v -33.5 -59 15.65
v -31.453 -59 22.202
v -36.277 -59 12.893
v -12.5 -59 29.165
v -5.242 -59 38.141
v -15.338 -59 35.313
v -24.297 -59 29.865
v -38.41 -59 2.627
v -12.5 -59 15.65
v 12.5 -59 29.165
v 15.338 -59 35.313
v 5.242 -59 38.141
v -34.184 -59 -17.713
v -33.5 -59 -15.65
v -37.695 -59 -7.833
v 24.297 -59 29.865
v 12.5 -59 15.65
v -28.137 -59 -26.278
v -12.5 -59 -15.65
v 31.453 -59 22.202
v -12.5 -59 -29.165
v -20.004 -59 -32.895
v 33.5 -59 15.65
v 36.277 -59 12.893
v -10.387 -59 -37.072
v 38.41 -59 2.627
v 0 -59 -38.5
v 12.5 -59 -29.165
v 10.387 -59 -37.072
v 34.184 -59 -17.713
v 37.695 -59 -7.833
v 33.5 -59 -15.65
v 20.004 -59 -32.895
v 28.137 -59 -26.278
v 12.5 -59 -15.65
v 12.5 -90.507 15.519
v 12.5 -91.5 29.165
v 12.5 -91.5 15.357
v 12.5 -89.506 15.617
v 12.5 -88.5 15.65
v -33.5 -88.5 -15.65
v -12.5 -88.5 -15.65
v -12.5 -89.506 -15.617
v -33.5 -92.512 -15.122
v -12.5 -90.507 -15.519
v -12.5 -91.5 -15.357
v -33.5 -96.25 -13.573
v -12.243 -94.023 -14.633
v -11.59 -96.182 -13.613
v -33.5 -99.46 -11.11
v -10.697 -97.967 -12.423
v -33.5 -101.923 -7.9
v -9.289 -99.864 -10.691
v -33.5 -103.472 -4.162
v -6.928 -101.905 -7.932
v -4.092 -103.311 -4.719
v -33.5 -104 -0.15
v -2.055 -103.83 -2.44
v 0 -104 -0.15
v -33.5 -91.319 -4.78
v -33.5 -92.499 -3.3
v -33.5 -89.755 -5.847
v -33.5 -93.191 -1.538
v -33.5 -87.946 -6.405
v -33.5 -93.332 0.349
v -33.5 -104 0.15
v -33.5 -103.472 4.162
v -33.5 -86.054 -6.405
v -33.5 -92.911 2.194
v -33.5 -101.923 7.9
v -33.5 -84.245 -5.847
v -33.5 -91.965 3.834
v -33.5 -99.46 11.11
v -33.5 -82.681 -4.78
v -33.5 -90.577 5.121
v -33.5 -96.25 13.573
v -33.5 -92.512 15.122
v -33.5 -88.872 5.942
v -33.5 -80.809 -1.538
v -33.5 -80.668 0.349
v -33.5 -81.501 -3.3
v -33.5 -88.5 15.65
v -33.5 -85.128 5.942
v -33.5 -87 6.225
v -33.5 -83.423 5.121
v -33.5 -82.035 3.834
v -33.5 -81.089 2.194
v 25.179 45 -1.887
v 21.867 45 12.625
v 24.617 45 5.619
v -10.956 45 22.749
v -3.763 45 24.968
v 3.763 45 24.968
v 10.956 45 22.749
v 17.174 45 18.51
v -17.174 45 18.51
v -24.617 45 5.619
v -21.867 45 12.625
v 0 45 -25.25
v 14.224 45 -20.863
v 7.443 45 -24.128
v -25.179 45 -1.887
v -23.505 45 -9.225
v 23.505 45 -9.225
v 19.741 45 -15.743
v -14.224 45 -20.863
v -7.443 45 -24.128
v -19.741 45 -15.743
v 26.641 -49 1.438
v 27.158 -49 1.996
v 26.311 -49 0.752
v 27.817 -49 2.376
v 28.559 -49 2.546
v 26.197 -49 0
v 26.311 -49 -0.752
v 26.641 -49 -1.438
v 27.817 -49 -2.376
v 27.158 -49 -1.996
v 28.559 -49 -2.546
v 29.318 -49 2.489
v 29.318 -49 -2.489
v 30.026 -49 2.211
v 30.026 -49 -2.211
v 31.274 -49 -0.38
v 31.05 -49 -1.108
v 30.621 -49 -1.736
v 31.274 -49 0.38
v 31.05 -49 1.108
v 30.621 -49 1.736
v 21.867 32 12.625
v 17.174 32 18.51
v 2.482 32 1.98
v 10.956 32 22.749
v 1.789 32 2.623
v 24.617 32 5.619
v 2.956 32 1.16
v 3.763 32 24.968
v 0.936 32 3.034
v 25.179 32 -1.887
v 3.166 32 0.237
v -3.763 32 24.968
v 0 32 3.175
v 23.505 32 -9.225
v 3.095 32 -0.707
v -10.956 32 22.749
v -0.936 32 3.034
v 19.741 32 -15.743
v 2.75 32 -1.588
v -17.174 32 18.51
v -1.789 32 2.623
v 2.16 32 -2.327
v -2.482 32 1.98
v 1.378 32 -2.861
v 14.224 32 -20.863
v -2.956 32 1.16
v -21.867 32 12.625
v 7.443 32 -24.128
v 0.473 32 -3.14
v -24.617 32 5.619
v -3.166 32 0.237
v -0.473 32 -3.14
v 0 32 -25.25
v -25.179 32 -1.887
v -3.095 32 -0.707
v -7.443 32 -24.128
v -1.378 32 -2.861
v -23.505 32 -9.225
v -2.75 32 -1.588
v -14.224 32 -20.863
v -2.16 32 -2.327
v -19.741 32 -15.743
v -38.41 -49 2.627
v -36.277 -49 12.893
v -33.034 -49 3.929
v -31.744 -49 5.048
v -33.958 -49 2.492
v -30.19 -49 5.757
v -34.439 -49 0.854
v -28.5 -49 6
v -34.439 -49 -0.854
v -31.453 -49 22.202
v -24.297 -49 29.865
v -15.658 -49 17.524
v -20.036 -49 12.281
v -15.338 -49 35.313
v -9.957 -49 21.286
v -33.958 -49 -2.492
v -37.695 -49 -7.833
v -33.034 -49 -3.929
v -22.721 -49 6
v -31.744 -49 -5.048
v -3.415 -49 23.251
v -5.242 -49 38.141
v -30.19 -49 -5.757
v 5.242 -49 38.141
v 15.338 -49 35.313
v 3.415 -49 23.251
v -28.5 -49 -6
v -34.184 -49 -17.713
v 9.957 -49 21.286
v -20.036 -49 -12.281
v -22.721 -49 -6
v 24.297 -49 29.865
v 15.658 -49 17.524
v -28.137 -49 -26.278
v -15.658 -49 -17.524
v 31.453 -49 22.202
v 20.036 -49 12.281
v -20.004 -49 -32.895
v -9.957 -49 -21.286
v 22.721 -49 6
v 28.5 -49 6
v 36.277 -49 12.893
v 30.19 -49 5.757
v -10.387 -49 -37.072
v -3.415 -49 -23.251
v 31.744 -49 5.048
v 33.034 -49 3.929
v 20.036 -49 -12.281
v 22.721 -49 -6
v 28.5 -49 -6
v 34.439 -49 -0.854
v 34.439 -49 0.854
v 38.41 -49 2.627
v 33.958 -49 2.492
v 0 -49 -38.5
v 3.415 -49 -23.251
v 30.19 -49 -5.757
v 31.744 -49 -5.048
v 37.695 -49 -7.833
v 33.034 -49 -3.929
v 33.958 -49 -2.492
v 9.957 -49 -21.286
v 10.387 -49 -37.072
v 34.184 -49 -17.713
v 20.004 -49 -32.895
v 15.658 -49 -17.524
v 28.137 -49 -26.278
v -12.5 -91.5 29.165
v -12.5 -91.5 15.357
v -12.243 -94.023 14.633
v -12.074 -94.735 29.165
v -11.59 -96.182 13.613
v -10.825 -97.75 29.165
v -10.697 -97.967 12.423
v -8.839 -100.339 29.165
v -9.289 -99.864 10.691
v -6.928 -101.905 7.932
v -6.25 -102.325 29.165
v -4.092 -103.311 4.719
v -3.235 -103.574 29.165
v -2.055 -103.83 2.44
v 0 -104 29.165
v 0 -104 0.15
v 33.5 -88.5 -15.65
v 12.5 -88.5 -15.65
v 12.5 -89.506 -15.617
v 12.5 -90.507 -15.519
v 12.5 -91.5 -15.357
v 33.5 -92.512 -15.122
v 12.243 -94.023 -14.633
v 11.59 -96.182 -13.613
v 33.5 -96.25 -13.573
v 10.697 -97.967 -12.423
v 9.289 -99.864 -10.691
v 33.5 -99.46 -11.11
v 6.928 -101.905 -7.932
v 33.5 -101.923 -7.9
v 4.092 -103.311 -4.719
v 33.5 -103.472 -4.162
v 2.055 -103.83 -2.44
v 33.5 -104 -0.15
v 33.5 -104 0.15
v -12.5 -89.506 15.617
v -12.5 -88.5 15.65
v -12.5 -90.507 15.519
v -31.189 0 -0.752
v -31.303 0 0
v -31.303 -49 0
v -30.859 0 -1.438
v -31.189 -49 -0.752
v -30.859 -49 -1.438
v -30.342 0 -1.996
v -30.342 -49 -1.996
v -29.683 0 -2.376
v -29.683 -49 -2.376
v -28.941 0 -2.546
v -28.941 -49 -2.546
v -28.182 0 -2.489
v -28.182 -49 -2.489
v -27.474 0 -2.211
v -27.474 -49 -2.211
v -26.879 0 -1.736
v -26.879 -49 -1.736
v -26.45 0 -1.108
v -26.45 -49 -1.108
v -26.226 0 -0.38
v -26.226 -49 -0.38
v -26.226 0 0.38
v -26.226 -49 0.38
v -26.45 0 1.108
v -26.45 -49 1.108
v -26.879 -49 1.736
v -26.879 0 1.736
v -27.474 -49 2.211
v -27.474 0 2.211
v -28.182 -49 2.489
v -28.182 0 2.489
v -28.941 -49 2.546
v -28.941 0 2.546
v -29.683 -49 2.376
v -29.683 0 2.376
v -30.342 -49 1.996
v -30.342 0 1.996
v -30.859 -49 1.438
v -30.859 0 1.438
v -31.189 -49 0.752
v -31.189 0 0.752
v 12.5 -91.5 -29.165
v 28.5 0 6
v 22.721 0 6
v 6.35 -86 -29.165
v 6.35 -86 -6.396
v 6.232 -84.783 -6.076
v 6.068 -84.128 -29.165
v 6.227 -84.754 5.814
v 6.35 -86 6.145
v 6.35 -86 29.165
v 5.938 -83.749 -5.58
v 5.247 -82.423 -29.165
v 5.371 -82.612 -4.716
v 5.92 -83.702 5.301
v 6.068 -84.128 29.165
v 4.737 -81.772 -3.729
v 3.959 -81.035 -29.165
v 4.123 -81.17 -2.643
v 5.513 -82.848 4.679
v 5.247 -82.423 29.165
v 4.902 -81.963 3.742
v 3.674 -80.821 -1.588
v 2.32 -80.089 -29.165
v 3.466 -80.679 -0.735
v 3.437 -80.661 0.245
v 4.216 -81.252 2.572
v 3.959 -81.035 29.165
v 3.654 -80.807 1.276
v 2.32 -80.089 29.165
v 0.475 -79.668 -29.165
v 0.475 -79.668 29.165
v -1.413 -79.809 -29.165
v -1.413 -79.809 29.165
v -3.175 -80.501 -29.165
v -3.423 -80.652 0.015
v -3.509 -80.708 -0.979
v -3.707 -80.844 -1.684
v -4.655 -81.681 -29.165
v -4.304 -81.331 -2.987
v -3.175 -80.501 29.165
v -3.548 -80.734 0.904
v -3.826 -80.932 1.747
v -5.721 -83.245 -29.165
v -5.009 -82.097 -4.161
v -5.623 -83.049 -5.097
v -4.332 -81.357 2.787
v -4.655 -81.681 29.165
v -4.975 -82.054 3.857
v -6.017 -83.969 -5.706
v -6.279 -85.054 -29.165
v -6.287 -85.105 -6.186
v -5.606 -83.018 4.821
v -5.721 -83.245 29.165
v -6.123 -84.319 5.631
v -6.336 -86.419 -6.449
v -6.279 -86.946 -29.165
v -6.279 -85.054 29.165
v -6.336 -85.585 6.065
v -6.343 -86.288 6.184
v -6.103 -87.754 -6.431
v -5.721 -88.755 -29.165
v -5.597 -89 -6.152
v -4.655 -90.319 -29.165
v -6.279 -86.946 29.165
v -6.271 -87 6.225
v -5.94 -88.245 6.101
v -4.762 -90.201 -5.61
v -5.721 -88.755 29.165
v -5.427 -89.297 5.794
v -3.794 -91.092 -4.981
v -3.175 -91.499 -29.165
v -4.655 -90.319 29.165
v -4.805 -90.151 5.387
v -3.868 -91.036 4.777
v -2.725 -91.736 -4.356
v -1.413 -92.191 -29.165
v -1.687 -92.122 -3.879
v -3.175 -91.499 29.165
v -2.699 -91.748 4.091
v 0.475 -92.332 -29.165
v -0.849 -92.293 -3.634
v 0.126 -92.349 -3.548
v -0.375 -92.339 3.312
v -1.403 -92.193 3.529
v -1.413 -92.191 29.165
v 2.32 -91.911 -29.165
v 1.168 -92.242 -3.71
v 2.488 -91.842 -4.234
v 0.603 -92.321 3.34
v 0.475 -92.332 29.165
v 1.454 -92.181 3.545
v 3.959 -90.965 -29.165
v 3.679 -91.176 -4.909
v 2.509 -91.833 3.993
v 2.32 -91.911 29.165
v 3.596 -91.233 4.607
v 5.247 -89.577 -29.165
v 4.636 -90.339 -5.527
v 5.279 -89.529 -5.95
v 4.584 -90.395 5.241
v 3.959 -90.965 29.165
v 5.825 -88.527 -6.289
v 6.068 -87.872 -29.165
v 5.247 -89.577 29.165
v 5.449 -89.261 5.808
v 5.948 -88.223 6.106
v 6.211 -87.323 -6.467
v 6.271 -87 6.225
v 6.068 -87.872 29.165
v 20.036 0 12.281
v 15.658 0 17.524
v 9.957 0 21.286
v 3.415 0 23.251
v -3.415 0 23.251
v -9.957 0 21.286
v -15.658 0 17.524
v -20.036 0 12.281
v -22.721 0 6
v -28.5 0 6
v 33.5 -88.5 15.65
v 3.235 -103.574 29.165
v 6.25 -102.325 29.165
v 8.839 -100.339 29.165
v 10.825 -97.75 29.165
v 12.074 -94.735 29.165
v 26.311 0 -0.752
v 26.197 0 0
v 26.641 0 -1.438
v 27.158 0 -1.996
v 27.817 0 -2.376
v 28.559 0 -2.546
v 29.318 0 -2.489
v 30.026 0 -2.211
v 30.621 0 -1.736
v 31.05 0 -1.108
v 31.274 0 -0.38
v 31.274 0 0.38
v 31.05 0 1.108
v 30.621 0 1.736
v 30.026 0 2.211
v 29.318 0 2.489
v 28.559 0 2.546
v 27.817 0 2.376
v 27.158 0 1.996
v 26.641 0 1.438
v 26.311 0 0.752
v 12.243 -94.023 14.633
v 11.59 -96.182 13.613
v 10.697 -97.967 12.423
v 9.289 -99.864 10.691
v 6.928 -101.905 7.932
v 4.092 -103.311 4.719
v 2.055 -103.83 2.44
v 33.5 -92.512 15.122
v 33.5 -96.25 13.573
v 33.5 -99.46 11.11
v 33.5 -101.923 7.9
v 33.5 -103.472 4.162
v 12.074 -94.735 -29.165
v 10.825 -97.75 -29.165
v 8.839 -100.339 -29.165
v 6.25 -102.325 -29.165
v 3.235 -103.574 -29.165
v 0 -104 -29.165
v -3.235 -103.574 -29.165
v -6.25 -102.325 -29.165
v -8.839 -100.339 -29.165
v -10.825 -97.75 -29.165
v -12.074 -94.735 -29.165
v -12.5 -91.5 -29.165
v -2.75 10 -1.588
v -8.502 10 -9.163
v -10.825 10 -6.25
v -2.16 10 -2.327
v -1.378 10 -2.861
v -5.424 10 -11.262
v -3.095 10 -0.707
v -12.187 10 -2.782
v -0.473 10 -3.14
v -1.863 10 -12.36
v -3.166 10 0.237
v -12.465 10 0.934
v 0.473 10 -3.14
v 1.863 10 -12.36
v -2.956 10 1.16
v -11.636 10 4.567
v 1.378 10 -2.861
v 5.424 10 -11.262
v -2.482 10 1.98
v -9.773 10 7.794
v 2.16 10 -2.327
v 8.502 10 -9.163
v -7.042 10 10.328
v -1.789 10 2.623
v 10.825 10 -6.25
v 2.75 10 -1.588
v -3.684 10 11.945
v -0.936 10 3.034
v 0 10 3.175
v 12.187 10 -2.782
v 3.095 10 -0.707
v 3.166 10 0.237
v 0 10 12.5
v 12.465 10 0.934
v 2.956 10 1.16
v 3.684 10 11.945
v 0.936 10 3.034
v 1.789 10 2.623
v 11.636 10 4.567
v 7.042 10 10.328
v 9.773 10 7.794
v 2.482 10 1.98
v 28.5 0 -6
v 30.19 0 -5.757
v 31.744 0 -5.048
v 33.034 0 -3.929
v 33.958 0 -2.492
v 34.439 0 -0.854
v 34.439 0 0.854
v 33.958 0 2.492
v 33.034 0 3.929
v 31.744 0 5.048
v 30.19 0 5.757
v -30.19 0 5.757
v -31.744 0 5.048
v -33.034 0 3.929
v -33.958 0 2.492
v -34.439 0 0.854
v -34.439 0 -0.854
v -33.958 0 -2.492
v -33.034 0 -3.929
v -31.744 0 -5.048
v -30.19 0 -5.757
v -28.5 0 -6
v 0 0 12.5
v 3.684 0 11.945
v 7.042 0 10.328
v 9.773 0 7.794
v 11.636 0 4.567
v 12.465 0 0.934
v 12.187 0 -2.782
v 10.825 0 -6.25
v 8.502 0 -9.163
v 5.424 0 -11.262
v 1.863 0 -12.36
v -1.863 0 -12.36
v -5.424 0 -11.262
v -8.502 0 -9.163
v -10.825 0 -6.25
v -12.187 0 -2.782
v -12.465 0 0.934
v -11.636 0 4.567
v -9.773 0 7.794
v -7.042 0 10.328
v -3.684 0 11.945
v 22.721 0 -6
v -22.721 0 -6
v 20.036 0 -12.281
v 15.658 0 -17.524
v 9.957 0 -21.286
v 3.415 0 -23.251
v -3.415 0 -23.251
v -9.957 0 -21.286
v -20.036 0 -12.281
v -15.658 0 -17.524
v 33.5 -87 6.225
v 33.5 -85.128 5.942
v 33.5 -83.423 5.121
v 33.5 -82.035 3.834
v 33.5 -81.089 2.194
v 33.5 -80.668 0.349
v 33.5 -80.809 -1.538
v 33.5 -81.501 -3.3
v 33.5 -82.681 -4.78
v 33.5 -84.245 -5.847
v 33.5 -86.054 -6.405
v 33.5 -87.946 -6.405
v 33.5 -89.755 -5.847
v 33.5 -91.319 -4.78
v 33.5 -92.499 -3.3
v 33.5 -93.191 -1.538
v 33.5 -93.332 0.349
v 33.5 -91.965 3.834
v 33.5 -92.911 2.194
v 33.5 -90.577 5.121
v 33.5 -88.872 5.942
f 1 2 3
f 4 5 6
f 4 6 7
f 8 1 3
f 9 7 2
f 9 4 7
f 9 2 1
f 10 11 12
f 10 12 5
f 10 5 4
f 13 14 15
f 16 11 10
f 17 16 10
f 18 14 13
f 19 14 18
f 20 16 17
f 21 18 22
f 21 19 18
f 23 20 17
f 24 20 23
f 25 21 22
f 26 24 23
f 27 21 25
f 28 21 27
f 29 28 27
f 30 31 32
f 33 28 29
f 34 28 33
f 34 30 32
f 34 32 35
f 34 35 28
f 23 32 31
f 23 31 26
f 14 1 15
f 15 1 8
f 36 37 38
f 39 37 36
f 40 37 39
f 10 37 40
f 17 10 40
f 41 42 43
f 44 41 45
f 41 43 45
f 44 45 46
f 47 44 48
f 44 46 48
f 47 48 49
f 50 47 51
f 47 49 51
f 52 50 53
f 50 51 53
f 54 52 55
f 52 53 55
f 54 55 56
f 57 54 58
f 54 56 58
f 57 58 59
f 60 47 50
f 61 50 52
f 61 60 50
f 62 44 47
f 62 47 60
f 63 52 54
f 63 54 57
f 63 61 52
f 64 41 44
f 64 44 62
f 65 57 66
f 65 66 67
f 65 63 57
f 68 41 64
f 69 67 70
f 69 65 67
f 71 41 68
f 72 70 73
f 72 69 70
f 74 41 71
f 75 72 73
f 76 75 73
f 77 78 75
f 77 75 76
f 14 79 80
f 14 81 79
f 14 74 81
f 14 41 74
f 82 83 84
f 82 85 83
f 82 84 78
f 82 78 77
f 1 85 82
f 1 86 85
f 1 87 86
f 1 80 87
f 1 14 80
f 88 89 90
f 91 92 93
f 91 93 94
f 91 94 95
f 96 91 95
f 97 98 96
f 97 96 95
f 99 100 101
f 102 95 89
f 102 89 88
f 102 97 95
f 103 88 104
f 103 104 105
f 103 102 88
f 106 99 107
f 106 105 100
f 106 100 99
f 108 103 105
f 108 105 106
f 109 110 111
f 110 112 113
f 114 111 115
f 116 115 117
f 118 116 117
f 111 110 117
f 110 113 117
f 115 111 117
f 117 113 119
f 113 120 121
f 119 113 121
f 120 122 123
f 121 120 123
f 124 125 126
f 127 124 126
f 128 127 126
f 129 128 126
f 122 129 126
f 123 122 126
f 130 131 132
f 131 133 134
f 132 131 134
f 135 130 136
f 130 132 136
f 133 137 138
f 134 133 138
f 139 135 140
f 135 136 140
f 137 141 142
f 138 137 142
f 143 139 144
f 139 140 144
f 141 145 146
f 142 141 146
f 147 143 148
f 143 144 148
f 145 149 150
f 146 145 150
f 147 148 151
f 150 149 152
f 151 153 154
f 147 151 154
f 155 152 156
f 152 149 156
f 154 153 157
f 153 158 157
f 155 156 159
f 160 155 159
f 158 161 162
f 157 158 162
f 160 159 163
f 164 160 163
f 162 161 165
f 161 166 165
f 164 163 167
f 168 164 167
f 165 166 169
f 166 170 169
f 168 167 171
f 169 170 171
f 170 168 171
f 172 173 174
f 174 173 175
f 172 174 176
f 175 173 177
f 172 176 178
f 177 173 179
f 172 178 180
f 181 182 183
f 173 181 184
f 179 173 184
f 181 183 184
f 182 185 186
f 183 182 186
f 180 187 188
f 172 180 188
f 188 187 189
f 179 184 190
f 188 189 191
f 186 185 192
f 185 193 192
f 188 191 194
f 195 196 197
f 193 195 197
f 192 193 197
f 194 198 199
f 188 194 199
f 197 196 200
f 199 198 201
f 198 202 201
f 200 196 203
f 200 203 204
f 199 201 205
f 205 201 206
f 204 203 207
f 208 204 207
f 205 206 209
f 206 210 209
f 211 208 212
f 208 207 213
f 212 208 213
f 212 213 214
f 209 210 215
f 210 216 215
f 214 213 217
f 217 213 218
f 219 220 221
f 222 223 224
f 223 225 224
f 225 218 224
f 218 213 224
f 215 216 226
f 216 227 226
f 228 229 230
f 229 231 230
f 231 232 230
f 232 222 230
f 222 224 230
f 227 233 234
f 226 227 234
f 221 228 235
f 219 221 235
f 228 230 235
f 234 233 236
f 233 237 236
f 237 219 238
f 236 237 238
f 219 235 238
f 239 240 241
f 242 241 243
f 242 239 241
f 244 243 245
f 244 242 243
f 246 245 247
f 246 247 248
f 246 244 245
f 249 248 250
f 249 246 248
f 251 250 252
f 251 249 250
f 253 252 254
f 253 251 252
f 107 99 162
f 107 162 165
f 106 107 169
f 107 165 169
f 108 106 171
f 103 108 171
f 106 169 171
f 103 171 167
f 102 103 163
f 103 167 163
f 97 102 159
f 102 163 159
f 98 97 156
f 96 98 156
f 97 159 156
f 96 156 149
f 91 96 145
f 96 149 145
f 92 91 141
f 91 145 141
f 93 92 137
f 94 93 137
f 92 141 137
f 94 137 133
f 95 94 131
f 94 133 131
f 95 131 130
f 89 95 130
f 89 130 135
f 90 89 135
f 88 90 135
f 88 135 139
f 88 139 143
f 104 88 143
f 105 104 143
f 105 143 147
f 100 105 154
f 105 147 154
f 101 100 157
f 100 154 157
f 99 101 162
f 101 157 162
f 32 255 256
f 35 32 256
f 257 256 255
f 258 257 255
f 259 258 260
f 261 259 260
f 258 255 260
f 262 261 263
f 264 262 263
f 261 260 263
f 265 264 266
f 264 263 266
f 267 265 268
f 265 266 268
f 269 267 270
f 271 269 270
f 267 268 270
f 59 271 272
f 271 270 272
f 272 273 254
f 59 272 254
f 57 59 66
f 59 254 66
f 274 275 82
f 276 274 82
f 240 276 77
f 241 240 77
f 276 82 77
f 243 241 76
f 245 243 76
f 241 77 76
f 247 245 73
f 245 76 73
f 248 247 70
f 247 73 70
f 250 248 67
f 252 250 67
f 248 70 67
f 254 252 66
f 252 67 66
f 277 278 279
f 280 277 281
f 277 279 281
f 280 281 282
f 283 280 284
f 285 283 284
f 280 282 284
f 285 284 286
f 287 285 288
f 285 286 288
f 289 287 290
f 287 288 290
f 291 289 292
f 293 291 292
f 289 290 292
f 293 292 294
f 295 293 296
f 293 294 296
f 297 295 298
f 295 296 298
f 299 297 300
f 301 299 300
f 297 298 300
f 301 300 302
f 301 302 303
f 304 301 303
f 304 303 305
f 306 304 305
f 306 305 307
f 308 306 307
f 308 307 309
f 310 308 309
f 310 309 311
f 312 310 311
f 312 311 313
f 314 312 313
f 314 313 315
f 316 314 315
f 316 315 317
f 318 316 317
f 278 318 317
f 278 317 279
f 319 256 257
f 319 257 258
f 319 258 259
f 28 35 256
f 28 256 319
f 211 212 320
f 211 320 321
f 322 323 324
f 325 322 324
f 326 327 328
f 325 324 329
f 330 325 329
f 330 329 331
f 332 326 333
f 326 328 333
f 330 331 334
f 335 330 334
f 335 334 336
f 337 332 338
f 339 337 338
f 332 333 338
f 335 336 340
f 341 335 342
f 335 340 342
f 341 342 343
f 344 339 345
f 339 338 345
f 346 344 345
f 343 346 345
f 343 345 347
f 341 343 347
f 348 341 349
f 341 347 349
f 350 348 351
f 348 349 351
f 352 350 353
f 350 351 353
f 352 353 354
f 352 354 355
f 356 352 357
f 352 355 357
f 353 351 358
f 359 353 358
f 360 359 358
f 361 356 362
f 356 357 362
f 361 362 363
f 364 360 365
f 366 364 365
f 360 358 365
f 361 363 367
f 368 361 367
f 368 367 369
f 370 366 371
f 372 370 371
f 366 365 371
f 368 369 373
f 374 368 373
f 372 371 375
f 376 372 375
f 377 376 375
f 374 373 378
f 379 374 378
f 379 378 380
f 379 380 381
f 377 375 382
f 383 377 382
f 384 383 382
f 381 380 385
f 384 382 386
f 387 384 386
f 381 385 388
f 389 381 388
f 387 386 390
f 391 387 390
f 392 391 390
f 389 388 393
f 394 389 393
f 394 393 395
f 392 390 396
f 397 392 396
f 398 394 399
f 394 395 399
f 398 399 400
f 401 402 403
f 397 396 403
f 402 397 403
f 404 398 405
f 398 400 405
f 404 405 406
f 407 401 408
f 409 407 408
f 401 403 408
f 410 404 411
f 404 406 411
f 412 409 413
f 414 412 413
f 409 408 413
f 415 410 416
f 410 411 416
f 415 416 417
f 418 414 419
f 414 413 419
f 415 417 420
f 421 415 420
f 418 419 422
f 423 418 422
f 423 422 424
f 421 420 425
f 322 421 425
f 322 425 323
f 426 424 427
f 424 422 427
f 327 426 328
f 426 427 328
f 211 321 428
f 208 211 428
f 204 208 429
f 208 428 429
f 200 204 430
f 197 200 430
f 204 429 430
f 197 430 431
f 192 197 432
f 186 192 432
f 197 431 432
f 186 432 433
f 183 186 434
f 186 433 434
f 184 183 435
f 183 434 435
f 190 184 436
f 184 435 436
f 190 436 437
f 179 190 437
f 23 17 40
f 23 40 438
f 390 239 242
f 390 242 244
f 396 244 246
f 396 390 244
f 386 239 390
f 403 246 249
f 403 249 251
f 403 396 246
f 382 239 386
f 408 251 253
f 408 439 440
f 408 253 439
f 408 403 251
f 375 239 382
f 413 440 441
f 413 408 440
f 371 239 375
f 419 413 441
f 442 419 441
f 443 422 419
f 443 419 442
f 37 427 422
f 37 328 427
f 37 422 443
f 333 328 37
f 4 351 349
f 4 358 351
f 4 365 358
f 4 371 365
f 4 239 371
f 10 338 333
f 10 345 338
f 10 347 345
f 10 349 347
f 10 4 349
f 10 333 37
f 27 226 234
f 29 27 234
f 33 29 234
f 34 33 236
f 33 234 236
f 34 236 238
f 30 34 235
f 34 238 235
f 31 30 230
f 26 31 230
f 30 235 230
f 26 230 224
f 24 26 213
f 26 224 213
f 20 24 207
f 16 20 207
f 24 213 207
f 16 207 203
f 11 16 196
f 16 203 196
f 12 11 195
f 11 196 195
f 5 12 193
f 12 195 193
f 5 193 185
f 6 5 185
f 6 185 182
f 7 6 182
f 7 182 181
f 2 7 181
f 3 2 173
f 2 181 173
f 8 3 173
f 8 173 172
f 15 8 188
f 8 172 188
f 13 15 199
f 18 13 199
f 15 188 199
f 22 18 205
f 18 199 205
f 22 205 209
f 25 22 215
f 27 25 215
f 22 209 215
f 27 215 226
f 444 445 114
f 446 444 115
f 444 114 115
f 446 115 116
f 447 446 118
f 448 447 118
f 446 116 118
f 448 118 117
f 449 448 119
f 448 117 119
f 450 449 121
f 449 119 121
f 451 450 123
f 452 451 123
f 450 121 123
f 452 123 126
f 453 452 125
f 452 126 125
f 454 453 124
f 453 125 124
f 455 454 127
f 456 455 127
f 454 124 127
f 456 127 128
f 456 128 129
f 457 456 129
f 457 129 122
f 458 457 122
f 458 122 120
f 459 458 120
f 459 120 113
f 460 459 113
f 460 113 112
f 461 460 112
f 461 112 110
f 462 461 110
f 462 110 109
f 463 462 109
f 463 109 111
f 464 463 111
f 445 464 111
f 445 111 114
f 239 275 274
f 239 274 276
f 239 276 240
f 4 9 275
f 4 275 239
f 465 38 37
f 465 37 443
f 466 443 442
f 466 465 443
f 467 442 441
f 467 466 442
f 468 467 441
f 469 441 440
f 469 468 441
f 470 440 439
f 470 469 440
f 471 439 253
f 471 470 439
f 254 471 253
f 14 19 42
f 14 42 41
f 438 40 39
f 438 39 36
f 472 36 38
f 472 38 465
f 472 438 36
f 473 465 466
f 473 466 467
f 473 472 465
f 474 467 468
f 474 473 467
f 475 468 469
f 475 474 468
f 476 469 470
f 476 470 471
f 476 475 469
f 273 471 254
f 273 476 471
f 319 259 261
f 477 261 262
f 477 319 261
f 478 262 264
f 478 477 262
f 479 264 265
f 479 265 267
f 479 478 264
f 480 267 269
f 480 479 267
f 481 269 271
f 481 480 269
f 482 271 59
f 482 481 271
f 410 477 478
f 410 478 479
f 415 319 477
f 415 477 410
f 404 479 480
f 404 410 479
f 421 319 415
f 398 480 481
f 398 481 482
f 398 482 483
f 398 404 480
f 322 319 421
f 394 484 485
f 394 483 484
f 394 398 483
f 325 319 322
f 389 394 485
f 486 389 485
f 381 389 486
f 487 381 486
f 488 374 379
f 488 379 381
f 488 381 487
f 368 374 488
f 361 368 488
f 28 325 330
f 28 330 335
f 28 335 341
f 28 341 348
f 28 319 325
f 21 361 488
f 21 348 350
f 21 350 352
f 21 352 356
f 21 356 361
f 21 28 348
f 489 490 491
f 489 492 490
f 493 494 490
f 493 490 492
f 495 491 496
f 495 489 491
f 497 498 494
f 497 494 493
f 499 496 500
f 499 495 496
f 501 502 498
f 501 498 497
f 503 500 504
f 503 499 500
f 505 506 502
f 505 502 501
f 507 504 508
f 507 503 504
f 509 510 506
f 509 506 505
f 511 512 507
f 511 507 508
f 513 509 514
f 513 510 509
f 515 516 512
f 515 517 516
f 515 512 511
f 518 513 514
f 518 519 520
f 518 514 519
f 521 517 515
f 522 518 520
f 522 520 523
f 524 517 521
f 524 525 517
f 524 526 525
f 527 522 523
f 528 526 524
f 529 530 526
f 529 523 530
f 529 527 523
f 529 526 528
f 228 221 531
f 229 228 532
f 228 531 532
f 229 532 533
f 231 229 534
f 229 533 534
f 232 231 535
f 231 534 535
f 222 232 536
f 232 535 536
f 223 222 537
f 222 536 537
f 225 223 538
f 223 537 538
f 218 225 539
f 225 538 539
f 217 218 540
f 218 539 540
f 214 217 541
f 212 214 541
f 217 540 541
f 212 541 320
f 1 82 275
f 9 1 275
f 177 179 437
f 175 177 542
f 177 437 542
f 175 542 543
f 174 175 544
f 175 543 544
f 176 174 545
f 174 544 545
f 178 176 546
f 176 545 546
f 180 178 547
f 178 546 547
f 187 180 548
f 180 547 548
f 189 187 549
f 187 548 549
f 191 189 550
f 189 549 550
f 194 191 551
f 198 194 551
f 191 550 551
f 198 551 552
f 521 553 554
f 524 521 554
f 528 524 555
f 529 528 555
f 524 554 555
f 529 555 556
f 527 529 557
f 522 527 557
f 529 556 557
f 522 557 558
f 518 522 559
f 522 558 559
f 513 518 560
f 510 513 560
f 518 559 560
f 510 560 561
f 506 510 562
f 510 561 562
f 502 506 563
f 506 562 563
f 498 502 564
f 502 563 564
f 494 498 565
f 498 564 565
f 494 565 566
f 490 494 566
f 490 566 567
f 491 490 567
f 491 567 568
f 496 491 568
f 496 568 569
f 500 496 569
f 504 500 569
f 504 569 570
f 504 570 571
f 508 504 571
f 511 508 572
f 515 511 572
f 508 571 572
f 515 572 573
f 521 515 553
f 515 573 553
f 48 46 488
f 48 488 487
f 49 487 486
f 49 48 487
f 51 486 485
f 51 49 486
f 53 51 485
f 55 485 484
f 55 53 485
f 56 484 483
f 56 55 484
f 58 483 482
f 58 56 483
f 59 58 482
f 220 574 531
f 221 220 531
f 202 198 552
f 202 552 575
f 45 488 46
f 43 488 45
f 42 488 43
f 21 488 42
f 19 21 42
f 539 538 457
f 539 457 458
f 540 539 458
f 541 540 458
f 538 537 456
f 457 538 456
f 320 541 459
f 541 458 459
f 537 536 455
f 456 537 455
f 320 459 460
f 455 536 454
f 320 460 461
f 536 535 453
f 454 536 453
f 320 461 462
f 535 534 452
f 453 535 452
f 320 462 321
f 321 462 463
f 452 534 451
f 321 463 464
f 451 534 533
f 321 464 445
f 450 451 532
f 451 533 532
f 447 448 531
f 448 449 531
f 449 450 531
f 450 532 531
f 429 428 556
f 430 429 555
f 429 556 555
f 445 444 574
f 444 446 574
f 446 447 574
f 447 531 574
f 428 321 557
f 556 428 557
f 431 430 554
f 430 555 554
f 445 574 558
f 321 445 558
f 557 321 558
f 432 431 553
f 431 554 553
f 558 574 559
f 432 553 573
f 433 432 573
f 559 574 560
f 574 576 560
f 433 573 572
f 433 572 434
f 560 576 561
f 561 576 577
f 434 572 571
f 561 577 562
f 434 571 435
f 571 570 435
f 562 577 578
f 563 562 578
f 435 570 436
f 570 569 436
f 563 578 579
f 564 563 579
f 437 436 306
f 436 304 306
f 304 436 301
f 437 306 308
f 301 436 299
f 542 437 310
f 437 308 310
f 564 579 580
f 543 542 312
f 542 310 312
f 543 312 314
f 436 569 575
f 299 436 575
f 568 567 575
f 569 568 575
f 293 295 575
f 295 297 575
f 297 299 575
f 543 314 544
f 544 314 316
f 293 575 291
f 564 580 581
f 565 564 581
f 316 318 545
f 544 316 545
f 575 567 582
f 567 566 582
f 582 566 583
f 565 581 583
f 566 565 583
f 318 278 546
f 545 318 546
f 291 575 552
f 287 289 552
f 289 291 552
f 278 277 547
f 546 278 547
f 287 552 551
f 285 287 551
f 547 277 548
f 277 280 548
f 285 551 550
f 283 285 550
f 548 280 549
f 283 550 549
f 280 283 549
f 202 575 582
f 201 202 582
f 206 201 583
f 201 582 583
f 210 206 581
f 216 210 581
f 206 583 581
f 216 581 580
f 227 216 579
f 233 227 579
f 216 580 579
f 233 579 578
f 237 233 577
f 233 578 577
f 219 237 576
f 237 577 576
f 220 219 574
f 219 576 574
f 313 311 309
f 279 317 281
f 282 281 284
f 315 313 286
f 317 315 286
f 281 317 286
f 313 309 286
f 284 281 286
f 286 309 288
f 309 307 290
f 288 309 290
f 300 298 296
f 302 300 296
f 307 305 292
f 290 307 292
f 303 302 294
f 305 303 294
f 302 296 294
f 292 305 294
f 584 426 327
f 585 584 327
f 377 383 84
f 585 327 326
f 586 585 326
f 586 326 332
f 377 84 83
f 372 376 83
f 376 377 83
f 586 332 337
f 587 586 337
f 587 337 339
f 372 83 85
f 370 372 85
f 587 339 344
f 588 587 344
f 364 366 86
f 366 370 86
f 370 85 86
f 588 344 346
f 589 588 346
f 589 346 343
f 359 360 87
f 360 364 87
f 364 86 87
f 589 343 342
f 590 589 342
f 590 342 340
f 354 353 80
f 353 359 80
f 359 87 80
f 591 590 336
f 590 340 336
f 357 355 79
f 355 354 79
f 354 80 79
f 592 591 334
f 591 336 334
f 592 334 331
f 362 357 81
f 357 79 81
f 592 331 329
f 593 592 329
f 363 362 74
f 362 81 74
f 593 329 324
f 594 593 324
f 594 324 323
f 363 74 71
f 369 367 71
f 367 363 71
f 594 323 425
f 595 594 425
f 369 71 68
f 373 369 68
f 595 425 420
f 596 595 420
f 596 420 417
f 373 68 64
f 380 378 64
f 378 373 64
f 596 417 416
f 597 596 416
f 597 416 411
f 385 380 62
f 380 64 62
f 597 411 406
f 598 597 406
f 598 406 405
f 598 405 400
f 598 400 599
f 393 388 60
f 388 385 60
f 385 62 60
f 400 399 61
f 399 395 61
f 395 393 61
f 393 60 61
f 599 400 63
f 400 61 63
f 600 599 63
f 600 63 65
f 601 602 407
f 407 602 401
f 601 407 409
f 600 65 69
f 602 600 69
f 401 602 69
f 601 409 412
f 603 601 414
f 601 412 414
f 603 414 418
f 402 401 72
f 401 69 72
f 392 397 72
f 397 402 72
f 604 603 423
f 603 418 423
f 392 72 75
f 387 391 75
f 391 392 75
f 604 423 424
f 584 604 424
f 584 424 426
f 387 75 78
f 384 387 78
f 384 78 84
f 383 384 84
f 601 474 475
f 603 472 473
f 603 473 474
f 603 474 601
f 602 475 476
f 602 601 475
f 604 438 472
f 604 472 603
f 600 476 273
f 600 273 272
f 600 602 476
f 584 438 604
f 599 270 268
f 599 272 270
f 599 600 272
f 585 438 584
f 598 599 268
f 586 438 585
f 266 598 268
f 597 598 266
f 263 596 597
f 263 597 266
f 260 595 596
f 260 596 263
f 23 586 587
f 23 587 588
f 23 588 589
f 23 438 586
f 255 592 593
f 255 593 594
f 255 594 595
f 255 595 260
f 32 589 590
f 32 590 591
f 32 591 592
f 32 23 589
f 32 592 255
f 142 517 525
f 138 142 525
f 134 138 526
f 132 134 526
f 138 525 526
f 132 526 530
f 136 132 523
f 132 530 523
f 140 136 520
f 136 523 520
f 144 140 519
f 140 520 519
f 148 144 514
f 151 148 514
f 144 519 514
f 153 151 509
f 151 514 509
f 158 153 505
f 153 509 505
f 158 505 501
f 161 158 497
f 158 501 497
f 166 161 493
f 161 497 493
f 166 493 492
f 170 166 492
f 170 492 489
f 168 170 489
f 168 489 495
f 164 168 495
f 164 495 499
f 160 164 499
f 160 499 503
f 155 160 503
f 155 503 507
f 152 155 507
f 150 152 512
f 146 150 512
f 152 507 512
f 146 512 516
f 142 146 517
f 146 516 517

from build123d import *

# Parameters (mm, degrees)
BOSS_EXTRUDE1_DEPTH        = 49
F_1_4_20_TAPPED_HOLE1_D    = 5.1054
SKETCH4_R                  = 38.5
BOSS_EXTRUDE2_DEPTH        = 10
BOSS_EXTRUDE3_DEPTH        = 45
FILLET1_R                  = 12.5
FILLET2_R                  = 15.5
F_1_2_0_5_DIAMETER_HOLE1_D = 12.7
F_1_2_0_5_DIAMETER_HOLE2_D = 12.7
SKETCH10_R                 = 12.5
BOSS_EXTRUDE4_DEPTH        = 10
SKETCH11_R                 = 3.175
BOSS_EXTRUDE5_DEPTH        = 22
SKETCH12_R                 = 25.25
BOSS_EXTRUDE6_DEPTH        = 13


with BuildPart() as part:
    # Sketch1 → Boss-Extrude1 (new body)
    with BuildSketch(Plane(origin=(0, 0, 0), x_dir=(1, 0, 0), z_dir=(0, 1, 0))):
        with BuildLine():
            Line((-28.5, 6), (-22.721135535, 6))
            ThreePointArc((-22.721135535, 6), (0, 23.5), (22.721135535, 6))
            Line((22.721135535, 6), (28.5, 6))
            ThreePointArc((28.5, 6), (34.5, 0), (28.5, -6))
            Line((28.5, -6), (22.721135535, -6))
            ThreePointArc((22.721135535, -6), (0, -23.5), (-22.721135535, -6))
            Line((-22.721135535, -6), (-28.5, -6))
            ThreePointArc((-28.5, -6), (-34.5, 0), (-28.5, 6))
        make_face()
    extrude(amount=-BOSS_EXTRUDE1_DEPTH)

    # 1/4-20 Tapped Hole1 (through all)
    with Locations(Plane(origin=(0, 0, 0), x_dir=(1, 0, 0), z_dir=(0, 1, 0))):
        with Locations((-28.75, 0), (28.75, 0)):
            Hole(F_1_4_20_TAPPED_HOLE1_D / 2)

    # Sketch4 → Boss-Extrude2 (add)
    with BuildSketch(Plane.XZ.offset(49)):
        with Locations(Location((0, 0, 0), (0, 0, 270))):
            Circle(SKETCH4_R)
    extrude(amount=BOSS_EXTRUDE2_DEPTH)

    # Sketch5 → Boss-Extrude3 (add)
    with BuildSketch(Plane.XZ.offset(59)):
        Polygon((12.5, 15.65), (33.5, 15.65), (33.5, -15.65), (12.5, -15.65), (12.5, -29.165), (-12.5, -29.165), (-12.5, -15.65), (-33.5, -15.65), (-33.5, 15.65), (-12.5, 15.65), (-12.5, 29.165), (12.5, 29.165), align=None)
    extrude(amount=BOSS_EXTRUDE3_DEPTH)

    # Fillet1
    fillet1_edges = [part.edges().sort_by_distance(p)[0] for p in [
        (12.5, -104, 22.4075),
        (-12.5, -104, 22.4075),
        (-12.5, -104, -22.4075),
        (12.5, -104, -22.4075),
    ]]
    fillet(fillet1_edges, radius=FILLET1_R - 0.0001)  # a hair under: the kernel refuses the full size

    # Fillet2
    fillet2_edges = [part.edges().sort_by_distance(p)[0] for p in [
        (-16.75005, -104, 15.65),
        (-16.75005, -104, -15.65),
        (16.75005, -104, 15.65),
        (16.75005, -104, -15.65),
    ]]
    fillet(fillet2_edges, radius=FILLET2_R)

    # 1/2 (0.5) Diameter Hole1 (through all)
    with Locations(Plane(origin=(0, 0, -29.165), x_dir=(-1, 0, 0), z_dir=(0, 0, -1))):
        with Locations((0, -86)):
            Hole(F_1_2_0_5_DIAMETER_HOLE1_D / 2)

    # 1/2 (0.5) Diameter Hole2 (through all)
    with Locations(Plane(origin=(33.5, 0, 0), x_dir=(0, 0, -1), z_dir=(1, 0, 0))):
        with Locations((0.125480769, -87)):
            Hole(F_1_2_0_5_DIAMETER_HOLE2_D / 2)

    # Sketch10 → Boss-Extrude4 (add)
    with BuildSketch(Plane(origin=(0, 0, 0), x_dir=(1, 0, 0), z_dir=(0, 1, 0))):
        with Locations(Location((0, 0, 0), (0, 0, 270))):
            Circle(SKETCH10_R)
    extrude(amount=BOSS_EXTRUDE4_DEPTH)

    # Sketch11 → Boss-Extrude5 (add)
    with BuildSketch(Plane(origin=(0, 10, 0), x_dir=(1, 0, 0), z_dir=(0, 1, 0))):
        with Locations(Location((0, 0, 0), (0, 0, 270))):
            Circle(SKETCH11_R)
    extrude(amount=BOSS_EXTRUDE5_DEPTH)

    # Sketch12 → Boss-Extrude6 (add)
    with BuildSketch(Plane(origin=(0, 32, 0), x_dir=(1, 0, 0), z_dir=(0, 1, 0))):
        with Locations(Location((0, 0, 0), (0, 0, 90))):
            Circle(SKETCH12_R)
    extrude(amount=BOSS_EXTRUDE6_DEPTH)


solid = part.part
